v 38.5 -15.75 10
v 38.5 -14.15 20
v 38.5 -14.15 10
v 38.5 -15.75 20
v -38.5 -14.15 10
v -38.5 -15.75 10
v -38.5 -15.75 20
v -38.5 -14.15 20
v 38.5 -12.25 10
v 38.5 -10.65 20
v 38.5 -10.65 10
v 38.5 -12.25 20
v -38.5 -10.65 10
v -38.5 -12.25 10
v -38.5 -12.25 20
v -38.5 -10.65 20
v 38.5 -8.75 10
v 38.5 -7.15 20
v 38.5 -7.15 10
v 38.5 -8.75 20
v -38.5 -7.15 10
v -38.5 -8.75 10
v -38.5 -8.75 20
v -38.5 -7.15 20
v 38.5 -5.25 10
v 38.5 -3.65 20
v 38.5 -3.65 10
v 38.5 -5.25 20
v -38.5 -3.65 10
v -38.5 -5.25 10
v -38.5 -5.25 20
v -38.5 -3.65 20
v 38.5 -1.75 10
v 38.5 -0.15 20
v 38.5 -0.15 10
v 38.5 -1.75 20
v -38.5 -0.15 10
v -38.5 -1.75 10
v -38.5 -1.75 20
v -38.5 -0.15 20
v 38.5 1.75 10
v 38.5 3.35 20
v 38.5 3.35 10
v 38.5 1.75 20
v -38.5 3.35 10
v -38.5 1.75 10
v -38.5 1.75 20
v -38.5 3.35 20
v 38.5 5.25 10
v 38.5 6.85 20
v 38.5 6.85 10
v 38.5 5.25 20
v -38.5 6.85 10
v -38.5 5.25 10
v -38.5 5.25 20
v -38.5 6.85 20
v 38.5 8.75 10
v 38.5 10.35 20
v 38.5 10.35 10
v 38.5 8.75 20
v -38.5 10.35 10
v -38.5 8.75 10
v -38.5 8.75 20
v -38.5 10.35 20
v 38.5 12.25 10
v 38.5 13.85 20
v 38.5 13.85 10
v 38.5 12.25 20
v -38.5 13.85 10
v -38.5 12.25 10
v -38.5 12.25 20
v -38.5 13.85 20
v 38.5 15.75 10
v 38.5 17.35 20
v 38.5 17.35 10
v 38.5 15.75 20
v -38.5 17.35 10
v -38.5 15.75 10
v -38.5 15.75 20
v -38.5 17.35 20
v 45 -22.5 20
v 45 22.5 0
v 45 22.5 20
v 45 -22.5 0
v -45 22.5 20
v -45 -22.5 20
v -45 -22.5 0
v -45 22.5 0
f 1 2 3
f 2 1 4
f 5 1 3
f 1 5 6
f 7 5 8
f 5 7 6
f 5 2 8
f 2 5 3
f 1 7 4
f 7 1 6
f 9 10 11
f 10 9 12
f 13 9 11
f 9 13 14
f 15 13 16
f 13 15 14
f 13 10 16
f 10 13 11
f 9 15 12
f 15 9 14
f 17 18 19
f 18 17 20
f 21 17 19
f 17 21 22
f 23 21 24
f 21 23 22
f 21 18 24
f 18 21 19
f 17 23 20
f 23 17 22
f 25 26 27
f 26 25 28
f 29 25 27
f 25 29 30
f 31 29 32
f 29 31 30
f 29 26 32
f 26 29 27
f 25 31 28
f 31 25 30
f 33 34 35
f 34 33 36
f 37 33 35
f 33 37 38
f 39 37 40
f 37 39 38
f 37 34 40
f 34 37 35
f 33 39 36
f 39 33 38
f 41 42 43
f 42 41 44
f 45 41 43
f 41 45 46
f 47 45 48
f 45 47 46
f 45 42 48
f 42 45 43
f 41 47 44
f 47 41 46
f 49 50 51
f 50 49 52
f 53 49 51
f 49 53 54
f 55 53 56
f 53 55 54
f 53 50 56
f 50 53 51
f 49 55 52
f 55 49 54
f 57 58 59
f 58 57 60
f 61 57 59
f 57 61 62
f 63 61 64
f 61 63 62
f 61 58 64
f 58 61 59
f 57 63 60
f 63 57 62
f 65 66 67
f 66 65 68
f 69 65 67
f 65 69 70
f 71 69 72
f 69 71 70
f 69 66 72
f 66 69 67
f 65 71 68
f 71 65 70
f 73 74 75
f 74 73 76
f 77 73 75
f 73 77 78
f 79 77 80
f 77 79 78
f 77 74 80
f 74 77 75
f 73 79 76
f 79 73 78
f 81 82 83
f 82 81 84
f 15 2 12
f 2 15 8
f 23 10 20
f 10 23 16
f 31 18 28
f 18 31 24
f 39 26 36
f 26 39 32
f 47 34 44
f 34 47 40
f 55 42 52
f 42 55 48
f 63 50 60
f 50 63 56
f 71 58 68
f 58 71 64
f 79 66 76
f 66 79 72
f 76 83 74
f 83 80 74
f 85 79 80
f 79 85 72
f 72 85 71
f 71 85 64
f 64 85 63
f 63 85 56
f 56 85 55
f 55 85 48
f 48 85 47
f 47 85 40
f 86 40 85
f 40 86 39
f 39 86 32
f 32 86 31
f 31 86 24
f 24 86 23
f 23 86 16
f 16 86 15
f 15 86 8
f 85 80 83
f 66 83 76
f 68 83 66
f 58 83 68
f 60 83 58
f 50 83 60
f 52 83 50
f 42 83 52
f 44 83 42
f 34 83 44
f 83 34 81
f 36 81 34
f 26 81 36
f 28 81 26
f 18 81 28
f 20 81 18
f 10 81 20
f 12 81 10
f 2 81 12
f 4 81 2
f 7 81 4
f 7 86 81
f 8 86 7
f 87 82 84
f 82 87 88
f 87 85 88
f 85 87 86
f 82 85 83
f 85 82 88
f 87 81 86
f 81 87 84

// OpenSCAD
// Slide drying rack - holds 10 microscope slides standing upright on their long edge
// Print orientation: base block on the bed, slots open upward (+Z)

// ---------------- Parameters ----------------
block_len    = 90;    // base block length along X (mm)
block_wid    = 45;    // base block width along Y (mm)
block_ht     = 20;    // base block height along Z (mm)

slot_len      = 77;   // slot length along X (mm)
slot_w        = 1.6;  // slot width along Y (mm)
slot_depth    = 10;   // slot depth into the block (mm)
slot_pitch    = 3.5;  // centre-to-centre slot spacing along Y (mm)
slot_count    = 10;   // number of slots

eps           = 0.5;  // overshoot so cutters pass cleanly through the top face (mm)

$fn = 64;

// ---------------- Model ----------------
difference() {
    // Solid base block, centred in X and Y, sitting on z = 0
    translate([-block_len/2, -block_wid/2, 0])
        cube([block_len, block_wid, block_ht]);

    // Row of parallel slots, centred on the block in X and Y
    for (i = [0 : slot_count - 1]) {
        y_c = (i - (slot_count - 1)/2) * slot_pitch;
        translate([-slot_len/2, y_c, block_ht - slot_depth])
            cube([slot_len, slot_w, slot_depth + eps]);
    }
}
